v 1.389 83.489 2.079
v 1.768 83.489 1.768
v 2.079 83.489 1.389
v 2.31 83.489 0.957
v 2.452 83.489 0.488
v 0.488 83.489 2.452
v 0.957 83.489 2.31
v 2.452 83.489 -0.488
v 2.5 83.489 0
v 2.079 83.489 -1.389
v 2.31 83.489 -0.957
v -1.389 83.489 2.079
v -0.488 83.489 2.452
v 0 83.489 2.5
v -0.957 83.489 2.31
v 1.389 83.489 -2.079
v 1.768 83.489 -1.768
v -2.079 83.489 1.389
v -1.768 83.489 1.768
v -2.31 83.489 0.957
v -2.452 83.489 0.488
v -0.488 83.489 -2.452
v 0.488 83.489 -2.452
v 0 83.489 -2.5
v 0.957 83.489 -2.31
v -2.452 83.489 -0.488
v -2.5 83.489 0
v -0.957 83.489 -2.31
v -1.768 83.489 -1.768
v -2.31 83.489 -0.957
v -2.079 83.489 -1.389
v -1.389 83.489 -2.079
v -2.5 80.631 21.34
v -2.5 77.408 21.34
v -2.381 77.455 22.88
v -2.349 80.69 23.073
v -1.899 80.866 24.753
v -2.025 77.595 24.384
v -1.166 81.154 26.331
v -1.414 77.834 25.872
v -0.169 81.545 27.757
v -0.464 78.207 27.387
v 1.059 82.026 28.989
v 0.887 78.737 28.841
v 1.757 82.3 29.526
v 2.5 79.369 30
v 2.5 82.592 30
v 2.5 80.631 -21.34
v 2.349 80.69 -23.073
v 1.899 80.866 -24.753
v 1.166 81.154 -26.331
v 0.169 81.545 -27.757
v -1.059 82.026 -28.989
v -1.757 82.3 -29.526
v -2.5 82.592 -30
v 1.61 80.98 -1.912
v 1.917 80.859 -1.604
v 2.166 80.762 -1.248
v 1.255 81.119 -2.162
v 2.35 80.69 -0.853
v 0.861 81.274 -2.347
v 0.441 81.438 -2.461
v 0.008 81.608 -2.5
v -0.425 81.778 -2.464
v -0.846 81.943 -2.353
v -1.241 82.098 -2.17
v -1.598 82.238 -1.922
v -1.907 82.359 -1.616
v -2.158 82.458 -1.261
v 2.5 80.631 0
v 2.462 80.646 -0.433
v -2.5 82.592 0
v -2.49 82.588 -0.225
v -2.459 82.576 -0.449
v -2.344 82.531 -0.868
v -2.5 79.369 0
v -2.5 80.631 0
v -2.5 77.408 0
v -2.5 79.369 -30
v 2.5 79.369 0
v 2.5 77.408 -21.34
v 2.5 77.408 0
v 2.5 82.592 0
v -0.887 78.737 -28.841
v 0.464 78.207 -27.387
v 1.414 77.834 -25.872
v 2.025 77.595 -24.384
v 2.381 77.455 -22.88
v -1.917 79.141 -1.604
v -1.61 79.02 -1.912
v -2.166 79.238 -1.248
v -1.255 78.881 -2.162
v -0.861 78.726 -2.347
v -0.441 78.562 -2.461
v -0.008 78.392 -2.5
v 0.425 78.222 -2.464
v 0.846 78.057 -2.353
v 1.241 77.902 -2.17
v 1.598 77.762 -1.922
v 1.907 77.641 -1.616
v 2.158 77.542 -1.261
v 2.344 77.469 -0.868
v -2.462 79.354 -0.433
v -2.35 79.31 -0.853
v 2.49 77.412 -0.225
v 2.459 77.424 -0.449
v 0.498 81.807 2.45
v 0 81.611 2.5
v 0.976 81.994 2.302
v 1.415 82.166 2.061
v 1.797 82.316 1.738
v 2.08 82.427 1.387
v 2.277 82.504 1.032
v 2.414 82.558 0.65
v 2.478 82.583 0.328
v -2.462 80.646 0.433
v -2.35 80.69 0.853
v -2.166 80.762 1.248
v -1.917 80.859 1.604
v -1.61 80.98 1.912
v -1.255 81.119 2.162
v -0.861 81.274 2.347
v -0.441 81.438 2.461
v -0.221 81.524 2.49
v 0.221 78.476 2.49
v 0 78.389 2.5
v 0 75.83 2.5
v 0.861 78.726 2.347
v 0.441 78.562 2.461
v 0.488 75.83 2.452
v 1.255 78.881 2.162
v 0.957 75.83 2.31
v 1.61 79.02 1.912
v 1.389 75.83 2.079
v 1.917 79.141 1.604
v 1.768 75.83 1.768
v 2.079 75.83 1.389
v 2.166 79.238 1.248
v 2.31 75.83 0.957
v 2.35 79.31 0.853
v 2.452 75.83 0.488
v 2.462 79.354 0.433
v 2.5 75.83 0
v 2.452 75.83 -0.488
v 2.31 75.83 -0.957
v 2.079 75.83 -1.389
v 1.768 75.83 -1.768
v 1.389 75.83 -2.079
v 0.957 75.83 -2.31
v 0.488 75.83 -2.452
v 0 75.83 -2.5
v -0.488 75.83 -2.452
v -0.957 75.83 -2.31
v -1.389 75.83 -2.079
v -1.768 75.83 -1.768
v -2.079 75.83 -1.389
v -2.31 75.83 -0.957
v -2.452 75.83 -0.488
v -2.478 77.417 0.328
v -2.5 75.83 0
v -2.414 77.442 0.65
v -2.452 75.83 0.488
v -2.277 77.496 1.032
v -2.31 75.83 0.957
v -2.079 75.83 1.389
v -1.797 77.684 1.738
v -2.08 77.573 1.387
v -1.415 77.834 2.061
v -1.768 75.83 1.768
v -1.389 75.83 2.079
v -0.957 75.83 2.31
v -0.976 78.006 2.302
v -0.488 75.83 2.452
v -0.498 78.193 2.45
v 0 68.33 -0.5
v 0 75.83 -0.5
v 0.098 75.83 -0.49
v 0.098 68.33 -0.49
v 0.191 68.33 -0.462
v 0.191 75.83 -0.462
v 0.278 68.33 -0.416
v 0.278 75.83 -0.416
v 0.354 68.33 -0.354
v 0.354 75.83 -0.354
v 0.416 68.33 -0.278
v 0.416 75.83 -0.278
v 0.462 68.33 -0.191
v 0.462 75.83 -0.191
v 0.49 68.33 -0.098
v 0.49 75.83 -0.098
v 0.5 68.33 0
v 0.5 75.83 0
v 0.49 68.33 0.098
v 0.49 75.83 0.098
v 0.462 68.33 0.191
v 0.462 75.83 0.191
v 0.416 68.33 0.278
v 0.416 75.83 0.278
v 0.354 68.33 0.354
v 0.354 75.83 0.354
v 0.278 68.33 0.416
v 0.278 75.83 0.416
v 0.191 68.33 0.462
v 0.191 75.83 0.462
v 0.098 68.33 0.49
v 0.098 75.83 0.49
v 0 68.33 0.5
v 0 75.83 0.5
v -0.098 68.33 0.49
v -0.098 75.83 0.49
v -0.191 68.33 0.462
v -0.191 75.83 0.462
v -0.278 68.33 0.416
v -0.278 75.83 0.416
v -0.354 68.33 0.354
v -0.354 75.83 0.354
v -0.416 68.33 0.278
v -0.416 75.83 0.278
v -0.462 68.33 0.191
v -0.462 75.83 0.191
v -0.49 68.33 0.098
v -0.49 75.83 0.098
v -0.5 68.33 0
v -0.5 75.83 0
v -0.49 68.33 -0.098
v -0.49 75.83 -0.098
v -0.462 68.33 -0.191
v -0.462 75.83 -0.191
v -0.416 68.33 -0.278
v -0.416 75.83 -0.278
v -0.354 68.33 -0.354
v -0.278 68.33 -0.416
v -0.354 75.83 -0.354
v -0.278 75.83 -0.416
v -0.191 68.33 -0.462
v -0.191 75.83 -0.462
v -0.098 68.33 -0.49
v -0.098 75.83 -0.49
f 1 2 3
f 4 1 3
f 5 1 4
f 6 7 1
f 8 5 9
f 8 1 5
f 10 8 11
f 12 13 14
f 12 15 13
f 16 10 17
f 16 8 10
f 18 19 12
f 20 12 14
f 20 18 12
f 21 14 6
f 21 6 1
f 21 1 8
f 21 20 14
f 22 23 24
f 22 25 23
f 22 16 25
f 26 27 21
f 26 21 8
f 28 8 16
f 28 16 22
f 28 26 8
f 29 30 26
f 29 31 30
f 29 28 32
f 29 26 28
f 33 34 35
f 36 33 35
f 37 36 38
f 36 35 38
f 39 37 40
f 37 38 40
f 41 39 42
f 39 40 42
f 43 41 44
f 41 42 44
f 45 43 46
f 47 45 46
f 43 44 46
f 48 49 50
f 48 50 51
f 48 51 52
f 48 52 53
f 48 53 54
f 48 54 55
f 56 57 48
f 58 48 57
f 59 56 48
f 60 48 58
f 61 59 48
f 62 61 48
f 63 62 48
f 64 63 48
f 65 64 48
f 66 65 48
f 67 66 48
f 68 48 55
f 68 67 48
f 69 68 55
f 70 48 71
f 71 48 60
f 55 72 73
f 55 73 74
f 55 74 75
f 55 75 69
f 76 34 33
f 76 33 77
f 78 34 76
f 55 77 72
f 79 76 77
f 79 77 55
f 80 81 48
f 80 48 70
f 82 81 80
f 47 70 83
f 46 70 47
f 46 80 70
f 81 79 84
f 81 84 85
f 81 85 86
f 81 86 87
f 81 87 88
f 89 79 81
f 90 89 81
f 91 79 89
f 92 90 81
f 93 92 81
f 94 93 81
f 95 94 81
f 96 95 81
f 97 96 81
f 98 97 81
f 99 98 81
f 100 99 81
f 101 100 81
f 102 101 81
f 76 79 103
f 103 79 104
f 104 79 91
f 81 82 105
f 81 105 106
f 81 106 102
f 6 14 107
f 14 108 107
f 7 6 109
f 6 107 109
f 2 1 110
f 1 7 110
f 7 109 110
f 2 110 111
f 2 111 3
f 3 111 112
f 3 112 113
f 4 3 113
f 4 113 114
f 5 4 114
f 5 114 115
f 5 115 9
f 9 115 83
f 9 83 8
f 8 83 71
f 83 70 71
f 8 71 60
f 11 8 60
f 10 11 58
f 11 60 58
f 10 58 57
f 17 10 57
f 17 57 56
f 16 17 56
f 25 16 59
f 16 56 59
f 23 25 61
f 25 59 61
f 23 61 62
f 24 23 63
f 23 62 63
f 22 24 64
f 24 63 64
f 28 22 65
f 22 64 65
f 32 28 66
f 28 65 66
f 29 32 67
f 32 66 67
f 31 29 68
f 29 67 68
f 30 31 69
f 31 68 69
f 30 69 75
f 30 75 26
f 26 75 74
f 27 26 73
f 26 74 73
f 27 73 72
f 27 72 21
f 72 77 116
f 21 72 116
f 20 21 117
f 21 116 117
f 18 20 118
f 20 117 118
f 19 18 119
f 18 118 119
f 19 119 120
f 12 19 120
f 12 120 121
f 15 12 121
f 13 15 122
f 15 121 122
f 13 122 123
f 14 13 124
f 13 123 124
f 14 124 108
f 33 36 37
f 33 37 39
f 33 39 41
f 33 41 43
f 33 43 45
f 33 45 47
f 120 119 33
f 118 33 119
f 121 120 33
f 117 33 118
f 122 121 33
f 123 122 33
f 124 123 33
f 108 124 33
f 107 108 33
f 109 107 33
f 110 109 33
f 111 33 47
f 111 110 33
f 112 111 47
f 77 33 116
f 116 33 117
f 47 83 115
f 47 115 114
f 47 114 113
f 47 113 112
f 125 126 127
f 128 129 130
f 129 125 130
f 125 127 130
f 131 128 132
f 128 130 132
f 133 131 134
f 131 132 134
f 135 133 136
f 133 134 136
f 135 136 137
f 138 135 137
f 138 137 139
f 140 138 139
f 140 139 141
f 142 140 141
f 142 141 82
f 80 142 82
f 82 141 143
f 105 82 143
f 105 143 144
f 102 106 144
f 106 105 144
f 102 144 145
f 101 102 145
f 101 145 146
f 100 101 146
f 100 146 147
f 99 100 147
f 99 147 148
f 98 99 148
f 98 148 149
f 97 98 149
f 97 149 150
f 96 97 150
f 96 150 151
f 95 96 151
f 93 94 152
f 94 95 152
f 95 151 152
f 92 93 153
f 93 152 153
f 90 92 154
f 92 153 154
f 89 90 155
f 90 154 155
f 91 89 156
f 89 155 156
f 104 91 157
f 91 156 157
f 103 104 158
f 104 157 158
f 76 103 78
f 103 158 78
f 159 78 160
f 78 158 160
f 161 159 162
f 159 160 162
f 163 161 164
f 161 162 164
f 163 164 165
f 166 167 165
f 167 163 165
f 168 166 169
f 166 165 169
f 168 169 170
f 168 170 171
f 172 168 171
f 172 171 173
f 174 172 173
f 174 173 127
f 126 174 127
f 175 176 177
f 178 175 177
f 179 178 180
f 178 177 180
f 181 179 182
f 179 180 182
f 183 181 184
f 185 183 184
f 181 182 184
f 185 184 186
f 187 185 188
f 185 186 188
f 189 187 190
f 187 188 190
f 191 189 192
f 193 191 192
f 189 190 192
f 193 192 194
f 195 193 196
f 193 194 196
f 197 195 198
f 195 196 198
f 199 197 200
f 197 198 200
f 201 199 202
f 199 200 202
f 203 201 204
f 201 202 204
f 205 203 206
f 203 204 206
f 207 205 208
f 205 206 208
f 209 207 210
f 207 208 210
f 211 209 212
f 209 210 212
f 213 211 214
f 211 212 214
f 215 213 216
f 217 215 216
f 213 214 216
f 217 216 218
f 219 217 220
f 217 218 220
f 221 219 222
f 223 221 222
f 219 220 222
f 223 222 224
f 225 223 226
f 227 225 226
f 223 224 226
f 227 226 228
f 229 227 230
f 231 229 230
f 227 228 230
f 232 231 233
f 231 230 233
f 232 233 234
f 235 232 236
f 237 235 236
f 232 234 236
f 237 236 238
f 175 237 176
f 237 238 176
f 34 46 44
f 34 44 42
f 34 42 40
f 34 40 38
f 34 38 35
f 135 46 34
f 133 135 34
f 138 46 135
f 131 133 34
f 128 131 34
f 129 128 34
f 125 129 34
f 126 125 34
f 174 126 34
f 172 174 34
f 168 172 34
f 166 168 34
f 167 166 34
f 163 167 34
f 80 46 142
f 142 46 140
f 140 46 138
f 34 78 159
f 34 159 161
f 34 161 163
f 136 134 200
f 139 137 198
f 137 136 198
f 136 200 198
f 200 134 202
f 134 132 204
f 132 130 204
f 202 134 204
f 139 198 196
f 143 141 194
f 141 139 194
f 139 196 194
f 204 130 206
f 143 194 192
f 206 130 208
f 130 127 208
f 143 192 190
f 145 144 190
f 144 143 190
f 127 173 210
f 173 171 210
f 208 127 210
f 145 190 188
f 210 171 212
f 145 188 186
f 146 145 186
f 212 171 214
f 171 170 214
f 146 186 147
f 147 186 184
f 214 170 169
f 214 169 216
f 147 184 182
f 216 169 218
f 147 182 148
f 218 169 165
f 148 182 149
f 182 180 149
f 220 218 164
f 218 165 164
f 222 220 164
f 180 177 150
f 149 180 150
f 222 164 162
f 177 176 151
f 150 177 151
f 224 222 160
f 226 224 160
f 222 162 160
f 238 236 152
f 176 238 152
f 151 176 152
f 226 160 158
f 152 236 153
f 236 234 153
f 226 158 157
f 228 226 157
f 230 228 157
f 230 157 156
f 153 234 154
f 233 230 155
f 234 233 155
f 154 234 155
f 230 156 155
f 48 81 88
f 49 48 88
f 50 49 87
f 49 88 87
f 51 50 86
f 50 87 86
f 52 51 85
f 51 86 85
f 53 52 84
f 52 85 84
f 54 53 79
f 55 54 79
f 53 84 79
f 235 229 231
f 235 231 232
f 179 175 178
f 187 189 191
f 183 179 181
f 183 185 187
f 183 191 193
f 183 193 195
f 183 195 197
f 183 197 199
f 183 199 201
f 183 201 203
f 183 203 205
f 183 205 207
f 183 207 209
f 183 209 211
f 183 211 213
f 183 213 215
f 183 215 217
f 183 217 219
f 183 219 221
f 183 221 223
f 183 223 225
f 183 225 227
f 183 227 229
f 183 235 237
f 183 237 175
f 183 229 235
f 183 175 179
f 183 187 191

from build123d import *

# Parameters (mm, degrees)
SKETCH2_R                = 2.5
BOSS_EXTRUDE1_DEPTH      = 100
BOSS_EXTRUDE2_DEPTH      = 200
CUT_EXTRUDE5_START       = 60.350129398
CUT_EXTRUDE5_DEPTH       = 39.299741204
CIRPATTERN2_COUNT        = 2
CUT_EXTRUDE13_START      = 60.350129398
CUT_EXTRUDE13_DEPTH      = 39.299741204
FILLET1_R                = 10
FILLET2_R                = 10
CUT_EXTRUDE14_DEPTH      = 105.432992871
CUT_EXTRUDE14_DEPTH_BACK = 105.432992871
SKETCH14_W               = 44.068346903
SKETCH14_H               = 27.8913588
CUT_EXTRUDE15_DEPTH      = 91.768685539
CUT_EXTRUDE15_DEPTH_BACK = 91.768685539
SKETCH15_W               = 22.136968411
SKETCH15_H               = 5.24183176
CUT_EXTRUDE16_DEPTH      = 89.750452329
CUT_EXTRUDE16_DEPTH_BACK = 89.750452329
SKETCH16_W               = 11.028183549
SKETCH16_H               = 76.248198314
CUT_EXTRUDE17_DEPTH      = 89.750452329
CUT_EXTRUDE17_DEPTH_BACK = 89.750452329
SKETCH19_W               = 10.280501296
SKETCH19_H               = 4.008748932
SKETCH20_R               = 0.5
BOSS_EXTRUDE3_DEPTH      = 7.5


# Read off the part's stored shape, not the designer's step: Cut-Extrude5, Cut-Extrude13
with BuildPart() as part:
    # Sketch2 → Boss-Extrude1 (new body)
    with BuildSketch(Plane(origin=(0, 0, 0), x_dir=(1, 0, 0), z_dir=(0, 1, 0))):
        with Locations(Location((0, 0, 0), (0, 0, 270))):
            Circle(SKETCH2_R)
    extrude(amount=BOSS_EXTRUDE1_DEPTH)

    # Sketch3 → Boss-Extrude2 (add)
    with BuildSketch(Plane.XY):
        Polygon((47.096645081, 63.143071984), (-46.001441122, 99.649870602), (-47.096645081, 96.856928016), (46.001441122, 60.350129398), align=None)
    boss_extrude2 = extrude(amount=-BOSS_EXTRUDE2_DEPTH)

    # Cut-Extrude5 outline → Cut-Extrude5 (cut)
    with BuildSketch(Plane(origin=(0, 0, 0), x_dir=(1, 0, 0), z_dir=(0, 1, 0)).offset(CUT_EXTRUDE5_START)):
        Polygon((-2.5, 0), (-2.5, 30), (2.5, 30), (2.5, 0), (49, 0), (49, 200), (-49, 200), (-49, 0), align=None)
    extrude(amount=CUT_EXTRUDE5_DEPTH, mode=Mode.SUBTRACT)

    # CirPattern2: Boss-Extrude2 ×2 about axis
    cirpattern2_axis = Axis((0, 100, 0), (0, -1, 0))
    for i in range(1, CIRPATTERN2_COUNT):
        add(boss_extrude2.rotate(cirpattern2_axis, i * 360 / CIRPATTERN2_COUNT))

    # Cut-Extrude13 outline → Cut-Extrude13 (cut)
    with BuildSketch(Plane(origin=(0, 0, 0), x_dir=(1, 0, 0), z_dir=(0, 1, 0)).offset(CUT_EXTRUDE13_START)):
        Polygon((-2.5, -30), (-2.5, 0), (-49, 0), (-49, -200), (49, -200), (49, 0), (2.5, 0), (2.5, -30), align=None)
    extrude(amount=CUT_EXTRUDE13_DEPTH, mode=Mode.SUBTRACT)

    # Fillet1
    # the kernel refuses this fillet: 10 mm, written as the material it takes off along each edge
    with BuildSketch(Plane(origin=(2.5, 55.757829393, -30), x_dir=(0, 0, 1), z_dir=(0, 1, 0))) as fillet1_piece_1:
        with BuildLine():
            CenterArc((8.660254038, -10), FILLET1_R, 90, 60)
            Line((0, -5), (-0.173205081, -4.9))
            ThreePointArc((-0.173205081, -4.9), (-0.2, -2.5), (-0.2, 0))
            Line((-0.2, 0), (0, 0.2))
            Line((0, 0.2), (8.660254038, 0.2))
            Line((8.660254038, 0.2), (8.660254038, 0))
        make_face()
    extrude(amount=46.523677998, mode=Mode.SUBTRACT)

    # Fillet2
    # the kernel refuses this fillet: 10 mm, written as the material it takes off along each edge
    with BuildSketch(Plane(origin=(-2.5, 55.757829393, 30), x_dir=(0, 0, -1), z_dir=(0, 1, 0))) as fillet2_piece_1:
        with BuildLine():
            CenterArc((8.660254038, -10), FILLET2_R, 90, 60)
            Line((0, -5), (-0.173205081, -4.9))
            ThreePointArc((-0.173205081, -4.9), (-0.2, -2.5), (-0.2, 0))
            Line((-0.2, 0), (0, 0.2))
            Line((0, 0.2), (8.660254038, 0.2))
            Line((8.660254038, 0.2), (8.660254038, 0))
        make_face()
    extrude(amount=46.523677998, mode=Mode.SUBTRACT)

    # Sketch14 → Cut-Extrude14 (cut, two sides: drawn at the far end of the back side and taken through both)
    with BuildSketch(Plane(origin=(0, 0, 0), x_dir=(0, 0, -1), z_dir=(1, 0, 0)).offset(-CUT_EXTRUDE14_DEPTH_BACK)):
        with Locations((-11.714370696, 99.576890266)):
            Rectangle(SKETCH14_W, SKETCH14_H)
    extrude(amount=CUT_EXTRUDE14_DEPTH + CUT_EXTRUDE14_DEPTH_BACK, mode=Mode.SUBTRACT)

    # Sketch15 → Cut-Extrude15 (cut, two sides: drawn at the far end of the back side and taken through both)
    with BuildSketch(Plane(origin=(0, 0, 0), x_dir=(0, 0, -1), z_dir=(1, 0, 0)).offset(-CUT_EXTRUDE15_DEPTH_BACK)):
        with Locations((-5.158121646, 86.109794113)):
            Rectangle(SKETCH15_W, SKETCH15_H)
    extrude(amount=CUT_EXTRUDE15_DEPTH + CUT_EXTRUDE15_DEPTH_BACK, mode=Mode.SUBTRACT)

    # Sketch16 → Cut-Extrude16 (cut, two sides: drawn at the far end of the back side and taken through both)
    with BuildSketch(Plane(origin=(0, 0, 0), x_dir=(0, 0, -1), z_dir=(1, 0, 0)).offset(-CUT_EXTRUDE16_DEPTH_BACK)):
        with Locations((1.378247022, 35.930712441)):
            Rectangle(SKETCH16_W, SKETCH16_H)
    extrude(amount=CUT_EXTRUDE16_DEPTH + CUT_EXTRUDE16_DEPTH_BACK, mode=Mode.SUBTRACT)

    # Sketch19 → Cut-Extrude17 (cut, two sides: drawn at the far end of the back side and taken through both)
    with BuildSketch(Plane(origin=(0, 0, 0), x_dir=(0, 0, -1), z_dir=(1, 0, 0)).offset(-CUT_EXTRUDE17_DEPTH_BACK)):
        with Locations((0.096985861, 73.82556599)):
            Rectangle(SKETCH19_W, SKETCH19_H)
    extrude(amount=CUT_EXTRUDE17_DEPTH + CUT_EXTRUDE17_DEPTH_BACK, mode=Mode.SUBTRACT)

    # Sketch20 → Boss-Extrude3 (add)
    with BuildSketch(Plane.XZ.offset(-75.829940456)):
        with Locations(Location((0, 0, 0), (0, 0, 270))):
            Circle(SKETCH20_R)
    extrude(amount=BOSS_EXTRUDE3_DEPTH)


solid = part.part
